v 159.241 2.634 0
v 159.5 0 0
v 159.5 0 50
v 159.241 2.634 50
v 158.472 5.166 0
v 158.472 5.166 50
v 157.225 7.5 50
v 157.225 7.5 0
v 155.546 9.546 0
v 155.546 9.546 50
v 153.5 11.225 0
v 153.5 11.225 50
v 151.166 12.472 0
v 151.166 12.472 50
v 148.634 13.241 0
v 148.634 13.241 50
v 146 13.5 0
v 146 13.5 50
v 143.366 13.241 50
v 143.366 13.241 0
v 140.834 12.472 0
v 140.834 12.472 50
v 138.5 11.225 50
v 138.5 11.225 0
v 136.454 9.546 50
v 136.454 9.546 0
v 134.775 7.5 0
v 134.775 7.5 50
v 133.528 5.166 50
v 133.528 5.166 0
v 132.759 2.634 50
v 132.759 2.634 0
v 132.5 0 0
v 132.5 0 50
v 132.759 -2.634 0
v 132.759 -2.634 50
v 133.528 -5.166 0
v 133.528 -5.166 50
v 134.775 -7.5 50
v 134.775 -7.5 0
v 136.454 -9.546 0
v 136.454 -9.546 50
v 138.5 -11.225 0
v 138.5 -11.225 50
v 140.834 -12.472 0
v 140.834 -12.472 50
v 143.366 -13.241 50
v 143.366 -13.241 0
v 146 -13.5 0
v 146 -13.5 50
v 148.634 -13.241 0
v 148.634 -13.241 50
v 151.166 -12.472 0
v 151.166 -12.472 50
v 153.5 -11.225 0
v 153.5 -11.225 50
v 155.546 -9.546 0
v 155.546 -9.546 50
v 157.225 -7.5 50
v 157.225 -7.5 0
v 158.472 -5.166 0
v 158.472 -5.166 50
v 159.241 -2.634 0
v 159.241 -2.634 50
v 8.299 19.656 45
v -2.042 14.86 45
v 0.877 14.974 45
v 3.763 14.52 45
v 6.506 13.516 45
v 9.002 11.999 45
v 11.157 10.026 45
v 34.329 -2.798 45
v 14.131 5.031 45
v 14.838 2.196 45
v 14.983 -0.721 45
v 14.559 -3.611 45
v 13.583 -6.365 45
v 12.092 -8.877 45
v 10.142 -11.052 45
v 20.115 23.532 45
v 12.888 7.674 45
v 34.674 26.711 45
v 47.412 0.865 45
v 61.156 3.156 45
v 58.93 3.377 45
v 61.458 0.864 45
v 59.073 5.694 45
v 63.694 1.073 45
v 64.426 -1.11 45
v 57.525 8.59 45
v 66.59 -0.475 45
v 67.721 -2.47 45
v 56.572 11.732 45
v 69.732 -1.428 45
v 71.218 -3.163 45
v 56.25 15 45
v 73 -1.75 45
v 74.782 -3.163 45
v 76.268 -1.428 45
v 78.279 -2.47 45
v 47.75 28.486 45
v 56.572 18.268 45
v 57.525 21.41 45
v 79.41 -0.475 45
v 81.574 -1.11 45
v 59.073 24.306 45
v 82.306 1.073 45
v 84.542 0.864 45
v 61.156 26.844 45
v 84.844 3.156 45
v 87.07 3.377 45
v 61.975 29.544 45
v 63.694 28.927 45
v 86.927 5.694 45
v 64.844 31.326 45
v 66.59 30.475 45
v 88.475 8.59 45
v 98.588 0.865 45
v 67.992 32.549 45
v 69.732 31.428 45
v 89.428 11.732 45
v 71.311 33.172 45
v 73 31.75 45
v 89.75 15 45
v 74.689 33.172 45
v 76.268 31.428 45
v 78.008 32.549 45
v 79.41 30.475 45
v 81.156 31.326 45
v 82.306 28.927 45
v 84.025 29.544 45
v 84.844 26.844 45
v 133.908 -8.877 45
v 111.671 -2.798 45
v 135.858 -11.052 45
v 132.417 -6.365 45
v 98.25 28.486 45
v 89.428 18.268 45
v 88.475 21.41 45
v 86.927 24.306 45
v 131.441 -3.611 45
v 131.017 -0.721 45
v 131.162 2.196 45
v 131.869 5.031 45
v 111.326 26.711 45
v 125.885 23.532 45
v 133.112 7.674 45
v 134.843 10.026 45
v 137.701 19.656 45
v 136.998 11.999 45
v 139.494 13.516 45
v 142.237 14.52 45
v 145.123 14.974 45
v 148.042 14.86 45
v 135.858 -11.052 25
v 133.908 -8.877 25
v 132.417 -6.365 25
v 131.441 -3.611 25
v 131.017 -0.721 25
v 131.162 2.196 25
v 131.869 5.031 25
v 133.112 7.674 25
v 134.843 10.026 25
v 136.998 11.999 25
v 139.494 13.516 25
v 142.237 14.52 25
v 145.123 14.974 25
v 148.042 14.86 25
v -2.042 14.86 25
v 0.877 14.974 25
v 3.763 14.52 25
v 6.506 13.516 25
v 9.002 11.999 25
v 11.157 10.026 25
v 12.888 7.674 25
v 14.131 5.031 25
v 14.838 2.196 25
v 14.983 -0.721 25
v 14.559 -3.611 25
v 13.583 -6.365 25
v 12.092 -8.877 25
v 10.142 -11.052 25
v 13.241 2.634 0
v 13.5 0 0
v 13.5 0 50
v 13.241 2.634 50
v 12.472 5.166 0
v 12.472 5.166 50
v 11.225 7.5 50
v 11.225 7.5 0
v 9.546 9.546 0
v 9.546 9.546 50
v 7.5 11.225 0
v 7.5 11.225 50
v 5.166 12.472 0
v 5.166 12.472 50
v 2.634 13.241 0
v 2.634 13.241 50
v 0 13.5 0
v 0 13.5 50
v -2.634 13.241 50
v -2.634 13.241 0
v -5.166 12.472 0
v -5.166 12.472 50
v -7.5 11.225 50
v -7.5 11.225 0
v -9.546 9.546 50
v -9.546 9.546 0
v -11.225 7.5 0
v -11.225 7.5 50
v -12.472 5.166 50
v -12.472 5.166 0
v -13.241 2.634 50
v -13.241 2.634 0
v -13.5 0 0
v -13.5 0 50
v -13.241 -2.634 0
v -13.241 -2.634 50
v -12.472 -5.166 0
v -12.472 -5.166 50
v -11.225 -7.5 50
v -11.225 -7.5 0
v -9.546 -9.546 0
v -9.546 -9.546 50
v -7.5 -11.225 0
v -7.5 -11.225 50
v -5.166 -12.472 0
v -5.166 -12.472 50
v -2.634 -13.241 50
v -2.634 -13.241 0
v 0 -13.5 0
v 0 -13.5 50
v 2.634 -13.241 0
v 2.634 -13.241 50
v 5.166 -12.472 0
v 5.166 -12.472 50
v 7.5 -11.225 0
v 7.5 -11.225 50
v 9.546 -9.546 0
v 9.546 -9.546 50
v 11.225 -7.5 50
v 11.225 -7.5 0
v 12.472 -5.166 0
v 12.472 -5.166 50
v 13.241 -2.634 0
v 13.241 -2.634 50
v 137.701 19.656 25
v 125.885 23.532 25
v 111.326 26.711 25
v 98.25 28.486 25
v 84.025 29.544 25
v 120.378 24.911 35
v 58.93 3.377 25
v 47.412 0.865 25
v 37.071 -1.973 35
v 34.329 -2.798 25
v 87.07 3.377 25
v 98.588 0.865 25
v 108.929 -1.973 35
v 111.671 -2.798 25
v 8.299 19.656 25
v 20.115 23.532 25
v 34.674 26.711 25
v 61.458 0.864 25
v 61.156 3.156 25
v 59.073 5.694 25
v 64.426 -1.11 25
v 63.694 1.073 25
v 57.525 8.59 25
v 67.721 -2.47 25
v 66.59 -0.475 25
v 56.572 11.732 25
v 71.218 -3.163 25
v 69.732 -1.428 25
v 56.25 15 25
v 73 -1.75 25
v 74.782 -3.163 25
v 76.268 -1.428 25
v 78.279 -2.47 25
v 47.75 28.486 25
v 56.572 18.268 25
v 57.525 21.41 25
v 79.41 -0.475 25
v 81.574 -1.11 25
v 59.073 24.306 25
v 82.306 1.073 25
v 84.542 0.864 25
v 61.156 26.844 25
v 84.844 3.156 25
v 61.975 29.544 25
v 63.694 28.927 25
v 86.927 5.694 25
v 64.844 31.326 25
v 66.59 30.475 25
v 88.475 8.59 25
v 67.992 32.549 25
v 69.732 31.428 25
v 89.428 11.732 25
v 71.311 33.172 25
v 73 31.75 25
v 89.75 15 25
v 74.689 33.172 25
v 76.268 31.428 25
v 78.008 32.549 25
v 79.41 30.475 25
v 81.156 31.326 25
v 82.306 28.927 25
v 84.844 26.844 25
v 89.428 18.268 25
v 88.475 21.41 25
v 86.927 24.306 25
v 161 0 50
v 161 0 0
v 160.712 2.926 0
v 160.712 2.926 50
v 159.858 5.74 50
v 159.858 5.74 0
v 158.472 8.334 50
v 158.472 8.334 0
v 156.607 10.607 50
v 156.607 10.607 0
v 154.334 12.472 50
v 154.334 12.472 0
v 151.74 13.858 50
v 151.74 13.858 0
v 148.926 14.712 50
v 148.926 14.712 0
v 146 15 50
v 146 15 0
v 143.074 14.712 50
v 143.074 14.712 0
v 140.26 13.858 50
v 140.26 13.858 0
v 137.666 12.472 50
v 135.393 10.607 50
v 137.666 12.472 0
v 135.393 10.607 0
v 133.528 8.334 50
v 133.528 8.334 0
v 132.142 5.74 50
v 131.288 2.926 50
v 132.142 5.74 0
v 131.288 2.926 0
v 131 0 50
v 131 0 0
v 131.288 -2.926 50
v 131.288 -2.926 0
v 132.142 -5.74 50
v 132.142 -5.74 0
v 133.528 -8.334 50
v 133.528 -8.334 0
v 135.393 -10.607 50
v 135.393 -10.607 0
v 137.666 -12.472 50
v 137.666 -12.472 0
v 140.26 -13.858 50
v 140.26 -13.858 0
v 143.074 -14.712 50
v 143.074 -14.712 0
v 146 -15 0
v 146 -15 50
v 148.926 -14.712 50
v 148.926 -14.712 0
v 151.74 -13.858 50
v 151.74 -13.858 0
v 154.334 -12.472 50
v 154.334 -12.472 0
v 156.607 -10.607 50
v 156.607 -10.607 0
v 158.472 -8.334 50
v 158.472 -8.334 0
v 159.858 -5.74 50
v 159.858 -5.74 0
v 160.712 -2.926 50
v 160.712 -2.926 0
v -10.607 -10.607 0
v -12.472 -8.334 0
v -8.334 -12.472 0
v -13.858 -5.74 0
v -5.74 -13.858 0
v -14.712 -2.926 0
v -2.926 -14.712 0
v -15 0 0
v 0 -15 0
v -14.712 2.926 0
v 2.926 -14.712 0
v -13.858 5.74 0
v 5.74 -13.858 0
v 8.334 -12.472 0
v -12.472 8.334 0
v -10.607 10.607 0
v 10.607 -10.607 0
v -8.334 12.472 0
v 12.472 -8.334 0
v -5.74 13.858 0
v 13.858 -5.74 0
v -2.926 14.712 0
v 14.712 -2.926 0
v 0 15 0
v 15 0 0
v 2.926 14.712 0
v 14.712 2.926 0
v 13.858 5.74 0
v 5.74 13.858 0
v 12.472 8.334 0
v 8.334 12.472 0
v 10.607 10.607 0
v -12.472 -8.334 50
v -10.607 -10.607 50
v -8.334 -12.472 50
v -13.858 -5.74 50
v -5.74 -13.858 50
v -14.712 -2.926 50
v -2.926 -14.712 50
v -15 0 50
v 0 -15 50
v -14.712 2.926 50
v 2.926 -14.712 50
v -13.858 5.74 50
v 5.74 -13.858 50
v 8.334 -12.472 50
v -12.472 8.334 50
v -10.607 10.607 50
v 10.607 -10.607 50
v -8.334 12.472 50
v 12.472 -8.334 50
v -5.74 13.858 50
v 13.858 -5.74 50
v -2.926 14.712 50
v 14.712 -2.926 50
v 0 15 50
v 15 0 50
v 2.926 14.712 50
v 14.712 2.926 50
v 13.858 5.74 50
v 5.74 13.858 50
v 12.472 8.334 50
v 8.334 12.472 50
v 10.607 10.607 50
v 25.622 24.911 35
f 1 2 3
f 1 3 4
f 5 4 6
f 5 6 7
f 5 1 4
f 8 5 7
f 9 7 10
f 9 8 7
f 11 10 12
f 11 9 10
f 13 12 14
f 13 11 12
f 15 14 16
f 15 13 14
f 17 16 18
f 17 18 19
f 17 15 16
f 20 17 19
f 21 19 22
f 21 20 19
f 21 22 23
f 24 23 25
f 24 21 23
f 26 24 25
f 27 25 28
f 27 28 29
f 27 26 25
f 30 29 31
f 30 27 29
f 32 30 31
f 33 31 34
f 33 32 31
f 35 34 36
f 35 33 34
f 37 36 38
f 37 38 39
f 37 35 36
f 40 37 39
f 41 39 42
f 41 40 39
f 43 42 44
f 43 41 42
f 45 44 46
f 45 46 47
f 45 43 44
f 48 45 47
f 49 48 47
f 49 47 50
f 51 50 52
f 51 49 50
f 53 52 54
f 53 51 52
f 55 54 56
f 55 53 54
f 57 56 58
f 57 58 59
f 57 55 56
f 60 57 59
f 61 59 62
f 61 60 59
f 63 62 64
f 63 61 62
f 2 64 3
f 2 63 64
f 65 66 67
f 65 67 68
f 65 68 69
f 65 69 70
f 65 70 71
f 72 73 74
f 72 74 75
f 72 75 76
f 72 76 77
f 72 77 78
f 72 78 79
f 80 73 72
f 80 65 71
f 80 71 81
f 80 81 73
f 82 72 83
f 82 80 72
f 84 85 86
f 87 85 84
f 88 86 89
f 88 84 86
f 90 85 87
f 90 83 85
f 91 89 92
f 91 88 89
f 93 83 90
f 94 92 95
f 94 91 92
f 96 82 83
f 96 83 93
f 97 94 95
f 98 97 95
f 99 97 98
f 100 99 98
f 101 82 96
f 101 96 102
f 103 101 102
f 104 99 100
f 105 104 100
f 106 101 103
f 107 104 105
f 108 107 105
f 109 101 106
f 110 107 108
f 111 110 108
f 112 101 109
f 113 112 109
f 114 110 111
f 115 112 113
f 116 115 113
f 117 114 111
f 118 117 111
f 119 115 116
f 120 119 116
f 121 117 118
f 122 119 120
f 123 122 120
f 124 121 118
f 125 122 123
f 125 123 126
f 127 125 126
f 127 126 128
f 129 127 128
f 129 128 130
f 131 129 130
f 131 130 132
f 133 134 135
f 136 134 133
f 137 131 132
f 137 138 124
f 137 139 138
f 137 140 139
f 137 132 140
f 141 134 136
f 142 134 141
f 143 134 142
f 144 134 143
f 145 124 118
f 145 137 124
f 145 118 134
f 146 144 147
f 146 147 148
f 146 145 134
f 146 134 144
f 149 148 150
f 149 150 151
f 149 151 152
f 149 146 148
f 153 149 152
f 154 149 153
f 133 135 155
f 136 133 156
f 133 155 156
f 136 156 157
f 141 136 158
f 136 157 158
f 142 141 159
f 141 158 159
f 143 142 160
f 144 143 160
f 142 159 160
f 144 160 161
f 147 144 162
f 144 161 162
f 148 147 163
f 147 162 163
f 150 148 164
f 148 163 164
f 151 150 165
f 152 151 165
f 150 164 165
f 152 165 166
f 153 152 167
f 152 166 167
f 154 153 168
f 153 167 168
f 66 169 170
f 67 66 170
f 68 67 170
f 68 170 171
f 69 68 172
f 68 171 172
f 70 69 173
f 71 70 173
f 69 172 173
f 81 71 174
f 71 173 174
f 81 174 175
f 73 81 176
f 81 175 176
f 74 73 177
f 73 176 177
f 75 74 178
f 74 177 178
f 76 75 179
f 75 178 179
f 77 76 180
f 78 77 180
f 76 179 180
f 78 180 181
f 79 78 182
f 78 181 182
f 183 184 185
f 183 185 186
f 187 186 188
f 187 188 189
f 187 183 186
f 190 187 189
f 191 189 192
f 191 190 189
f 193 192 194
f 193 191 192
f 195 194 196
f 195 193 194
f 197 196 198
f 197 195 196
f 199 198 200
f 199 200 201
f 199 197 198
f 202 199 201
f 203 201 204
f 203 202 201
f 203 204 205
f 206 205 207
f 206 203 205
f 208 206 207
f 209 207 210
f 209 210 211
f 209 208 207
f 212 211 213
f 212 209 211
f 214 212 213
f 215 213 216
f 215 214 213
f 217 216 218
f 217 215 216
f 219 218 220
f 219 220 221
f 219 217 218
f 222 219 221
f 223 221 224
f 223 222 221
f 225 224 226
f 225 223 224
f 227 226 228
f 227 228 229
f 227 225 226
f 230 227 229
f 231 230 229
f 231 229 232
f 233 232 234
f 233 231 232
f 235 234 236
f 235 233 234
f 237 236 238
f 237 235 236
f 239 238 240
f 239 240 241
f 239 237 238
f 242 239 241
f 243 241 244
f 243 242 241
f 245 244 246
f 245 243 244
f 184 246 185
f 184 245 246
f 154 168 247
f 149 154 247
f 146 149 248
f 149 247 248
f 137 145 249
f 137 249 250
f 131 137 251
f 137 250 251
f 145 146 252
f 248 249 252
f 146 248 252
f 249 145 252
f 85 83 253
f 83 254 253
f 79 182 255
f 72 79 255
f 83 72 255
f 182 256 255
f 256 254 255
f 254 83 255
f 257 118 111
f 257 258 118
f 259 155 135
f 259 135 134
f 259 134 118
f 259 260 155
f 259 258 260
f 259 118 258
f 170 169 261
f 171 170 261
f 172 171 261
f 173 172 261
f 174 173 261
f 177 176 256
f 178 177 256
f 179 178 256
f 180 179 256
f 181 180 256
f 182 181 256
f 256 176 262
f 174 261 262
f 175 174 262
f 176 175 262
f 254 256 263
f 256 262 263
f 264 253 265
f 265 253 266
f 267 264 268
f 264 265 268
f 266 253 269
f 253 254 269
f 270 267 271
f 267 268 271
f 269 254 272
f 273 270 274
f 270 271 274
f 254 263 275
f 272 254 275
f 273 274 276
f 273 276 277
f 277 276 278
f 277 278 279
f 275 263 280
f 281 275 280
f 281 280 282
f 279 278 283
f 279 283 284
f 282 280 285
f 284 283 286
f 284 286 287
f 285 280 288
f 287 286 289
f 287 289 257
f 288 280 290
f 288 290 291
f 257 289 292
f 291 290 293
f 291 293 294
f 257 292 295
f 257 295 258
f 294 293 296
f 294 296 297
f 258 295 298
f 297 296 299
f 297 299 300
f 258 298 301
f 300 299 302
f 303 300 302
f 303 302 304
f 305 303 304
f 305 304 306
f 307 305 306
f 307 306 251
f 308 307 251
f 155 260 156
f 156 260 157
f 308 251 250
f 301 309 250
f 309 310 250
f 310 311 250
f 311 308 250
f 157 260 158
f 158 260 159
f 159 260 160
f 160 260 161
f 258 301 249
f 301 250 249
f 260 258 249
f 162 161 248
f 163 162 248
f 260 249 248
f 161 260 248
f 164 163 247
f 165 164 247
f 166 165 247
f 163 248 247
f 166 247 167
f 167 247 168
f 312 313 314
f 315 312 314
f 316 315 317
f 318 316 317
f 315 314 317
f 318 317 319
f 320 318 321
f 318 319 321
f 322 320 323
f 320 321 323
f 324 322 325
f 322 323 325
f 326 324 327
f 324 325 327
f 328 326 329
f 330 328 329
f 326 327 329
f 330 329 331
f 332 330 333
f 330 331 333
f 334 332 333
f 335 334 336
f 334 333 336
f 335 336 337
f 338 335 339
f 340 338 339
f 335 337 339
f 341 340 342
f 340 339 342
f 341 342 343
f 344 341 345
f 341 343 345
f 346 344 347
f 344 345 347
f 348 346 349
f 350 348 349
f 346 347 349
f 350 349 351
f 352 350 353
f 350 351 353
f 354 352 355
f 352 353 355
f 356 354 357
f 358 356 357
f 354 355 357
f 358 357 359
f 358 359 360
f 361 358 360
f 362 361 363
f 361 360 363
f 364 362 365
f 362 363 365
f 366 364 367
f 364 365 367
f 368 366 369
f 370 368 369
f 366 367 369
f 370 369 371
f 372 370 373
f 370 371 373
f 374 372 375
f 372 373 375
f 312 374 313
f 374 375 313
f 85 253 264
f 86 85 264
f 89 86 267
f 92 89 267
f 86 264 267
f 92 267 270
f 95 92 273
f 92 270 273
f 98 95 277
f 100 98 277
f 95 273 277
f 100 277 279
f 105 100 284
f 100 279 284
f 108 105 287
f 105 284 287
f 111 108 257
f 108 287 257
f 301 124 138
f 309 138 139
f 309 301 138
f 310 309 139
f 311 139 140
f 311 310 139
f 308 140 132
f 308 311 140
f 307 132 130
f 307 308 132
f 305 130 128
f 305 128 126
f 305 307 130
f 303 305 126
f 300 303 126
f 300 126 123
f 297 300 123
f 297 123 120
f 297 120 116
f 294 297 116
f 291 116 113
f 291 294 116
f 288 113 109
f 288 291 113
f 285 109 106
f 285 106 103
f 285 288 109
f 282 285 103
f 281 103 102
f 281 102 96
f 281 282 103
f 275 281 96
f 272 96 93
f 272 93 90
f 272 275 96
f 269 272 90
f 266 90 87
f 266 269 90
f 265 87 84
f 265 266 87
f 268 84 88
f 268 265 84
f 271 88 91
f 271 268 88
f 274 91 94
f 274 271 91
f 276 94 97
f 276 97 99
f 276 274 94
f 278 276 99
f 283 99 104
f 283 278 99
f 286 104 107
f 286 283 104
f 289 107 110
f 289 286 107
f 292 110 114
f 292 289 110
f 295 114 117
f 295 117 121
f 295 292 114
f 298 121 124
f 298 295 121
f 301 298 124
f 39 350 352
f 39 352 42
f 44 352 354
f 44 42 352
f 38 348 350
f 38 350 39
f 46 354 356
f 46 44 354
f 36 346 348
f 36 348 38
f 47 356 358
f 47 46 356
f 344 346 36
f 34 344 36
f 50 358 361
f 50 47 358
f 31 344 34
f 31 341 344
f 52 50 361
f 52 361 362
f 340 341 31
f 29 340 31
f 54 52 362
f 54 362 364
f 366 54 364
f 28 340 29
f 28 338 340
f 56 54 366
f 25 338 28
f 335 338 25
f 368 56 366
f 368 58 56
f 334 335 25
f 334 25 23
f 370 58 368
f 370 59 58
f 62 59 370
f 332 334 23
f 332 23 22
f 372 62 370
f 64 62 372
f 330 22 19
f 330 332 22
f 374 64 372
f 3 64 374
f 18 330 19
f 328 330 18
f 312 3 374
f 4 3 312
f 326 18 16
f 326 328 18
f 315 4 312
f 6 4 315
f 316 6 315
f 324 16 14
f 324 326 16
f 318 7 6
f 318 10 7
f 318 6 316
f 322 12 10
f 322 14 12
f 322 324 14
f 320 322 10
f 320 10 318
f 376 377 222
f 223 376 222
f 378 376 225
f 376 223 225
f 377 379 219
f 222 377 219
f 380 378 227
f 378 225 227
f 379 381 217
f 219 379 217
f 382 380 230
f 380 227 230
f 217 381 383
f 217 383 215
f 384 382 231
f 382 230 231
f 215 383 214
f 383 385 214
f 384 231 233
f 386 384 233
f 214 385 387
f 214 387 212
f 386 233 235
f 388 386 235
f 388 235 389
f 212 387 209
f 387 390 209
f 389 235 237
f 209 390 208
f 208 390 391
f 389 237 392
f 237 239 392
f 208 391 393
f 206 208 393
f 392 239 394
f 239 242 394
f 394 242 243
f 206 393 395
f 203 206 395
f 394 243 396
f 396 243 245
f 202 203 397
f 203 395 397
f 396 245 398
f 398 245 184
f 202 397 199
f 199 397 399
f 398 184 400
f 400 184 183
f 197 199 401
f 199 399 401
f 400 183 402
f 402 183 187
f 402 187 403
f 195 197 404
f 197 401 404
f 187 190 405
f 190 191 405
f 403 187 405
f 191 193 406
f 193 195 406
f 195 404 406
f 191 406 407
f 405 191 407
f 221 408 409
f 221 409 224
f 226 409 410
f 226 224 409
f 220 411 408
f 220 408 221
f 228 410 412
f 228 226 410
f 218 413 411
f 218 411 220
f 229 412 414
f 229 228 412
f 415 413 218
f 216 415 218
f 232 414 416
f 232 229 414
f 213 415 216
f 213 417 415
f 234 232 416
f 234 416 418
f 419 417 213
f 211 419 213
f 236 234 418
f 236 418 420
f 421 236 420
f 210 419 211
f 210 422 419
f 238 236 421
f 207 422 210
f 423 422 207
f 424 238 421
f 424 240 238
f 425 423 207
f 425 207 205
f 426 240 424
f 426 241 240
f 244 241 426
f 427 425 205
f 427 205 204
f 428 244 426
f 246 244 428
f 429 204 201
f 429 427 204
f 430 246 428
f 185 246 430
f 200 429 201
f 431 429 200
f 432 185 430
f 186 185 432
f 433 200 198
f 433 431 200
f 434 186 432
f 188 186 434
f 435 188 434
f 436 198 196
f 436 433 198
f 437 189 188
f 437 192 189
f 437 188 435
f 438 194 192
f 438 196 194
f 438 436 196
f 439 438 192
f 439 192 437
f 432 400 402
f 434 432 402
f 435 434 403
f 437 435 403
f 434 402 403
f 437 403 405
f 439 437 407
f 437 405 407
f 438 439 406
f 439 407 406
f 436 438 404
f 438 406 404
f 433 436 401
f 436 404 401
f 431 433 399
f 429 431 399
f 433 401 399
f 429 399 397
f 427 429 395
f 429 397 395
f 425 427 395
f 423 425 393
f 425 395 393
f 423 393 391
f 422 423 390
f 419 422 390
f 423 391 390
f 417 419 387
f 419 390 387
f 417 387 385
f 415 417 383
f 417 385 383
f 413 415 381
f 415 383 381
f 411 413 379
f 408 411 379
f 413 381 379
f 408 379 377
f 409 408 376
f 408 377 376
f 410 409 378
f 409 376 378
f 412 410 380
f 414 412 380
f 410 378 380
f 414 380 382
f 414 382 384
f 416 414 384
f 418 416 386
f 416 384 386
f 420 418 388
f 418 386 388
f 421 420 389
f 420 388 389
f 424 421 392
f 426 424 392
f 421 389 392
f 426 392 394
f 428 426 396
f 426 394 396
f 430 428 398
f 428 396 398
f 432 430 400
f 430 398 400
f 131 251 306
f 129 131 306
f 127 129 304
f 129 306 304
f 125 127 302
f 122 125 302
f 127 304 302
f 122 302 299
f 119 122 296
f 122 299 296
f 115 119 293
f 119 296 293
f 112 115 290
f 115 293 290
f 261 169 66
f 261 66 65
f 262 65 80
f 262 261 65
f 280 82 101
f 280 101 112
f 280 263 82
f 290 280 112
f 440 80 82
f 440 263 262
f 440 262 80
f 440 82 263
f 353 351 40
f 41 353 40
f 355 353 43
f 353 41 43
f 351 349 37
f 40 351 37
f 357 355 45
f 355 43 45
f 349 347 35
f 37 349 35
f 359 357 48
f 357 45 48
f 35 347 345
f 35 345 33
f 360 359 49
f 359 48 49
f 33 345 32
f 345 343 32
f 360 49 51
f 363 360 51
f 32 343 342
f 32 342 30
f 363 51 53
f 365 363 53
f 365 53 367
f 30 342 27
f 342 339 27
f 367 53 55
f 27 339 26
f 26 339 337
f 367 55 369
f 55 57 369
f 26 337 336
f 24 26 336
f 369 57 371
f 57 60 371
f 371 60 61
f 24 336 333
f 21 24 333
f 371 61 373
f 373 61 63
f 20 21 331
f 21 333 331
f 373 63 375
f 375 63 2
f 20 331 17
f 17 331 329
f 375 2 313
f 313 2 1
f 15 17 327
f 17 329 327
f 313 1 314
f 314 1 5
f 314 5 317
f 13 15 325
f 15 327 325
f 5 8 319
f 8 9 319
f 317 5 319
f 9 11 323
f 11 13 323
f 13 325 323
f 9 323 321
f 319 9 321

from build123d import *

# Parameters (mm, degrees)
SKETCH1_R             = 15
SKETCH1_R_2           = 13.5
BOSS_EXTRUDE1_DEPTH   = 50
BOSS_EXTRUDE1_2_DEPTH = 50
SKETCH2_R             = 16.75
BOSS_EXTRUDE5_DEPTH   = 20


with BuildPart() as part:
    # Sketch1 → Boss-Extrude1 (new body)
    with BuildSketch(Plane.XY):
        Circle(SKETCH1_R)
        Circle(SKETCH1_R_2, mode=Mode.SUBTRACT)
    extrude(amount=BOSS_EXTRUDE1_DEPTH)


with BuildPart() as body_2:
    # Sketch1 → Boss-Extrude1 2 (new body)
    with BuildSketch(Plane.XY):
        with Locations((146, 0)):
            Circle(SKETCH1_R)
        with Locations((146, 0)):
            Circle(SKETCH1_R_2, mode=Mode.SUBTRACT)
    extrude(amount=BOSS_EXTRUDE1_2_DEPTH)


with BuildPart() as body_3:
    # Sketch2 → Boss-Extrude5 (new body)
    with BuildSketch(Plane.XY.offset(25)):
        with BuildLine():
            ThreePointArc((58.930048431, 3.376792059), (73, -3.25), (87.069951569, 3.376792059))
            add(Edge.make_bspline(
                [(135.858074214, -11.051757388), (106.393657142, -0.108887447), (87.069951569, 3.376792059)],
                knots=[0, 0, 0, 1, 1, 1], degree=2))
            ThreePointArc((135.858074214, -11.051757388), (132.425663063, 6.382583858), (148.04182941, 14.860381309))
            add(Edge.make_bspline(
                [(148.04182941, 14.860381309), (124.723417301, 27.619088806), (84.024892619, 29.54352924)],
                knots=[0, 0, 0, 1, 1, 1], degree=2))
            ThreePointArc((84.024892619, 29.54352924), (73, 33.25), (61.975107381, 29.54352924))
            add(Edge.make_bspline(
                [(-2.04182941, 14.860381309), (21.276582699, 27.619088806), (61.975107381, 29.54352924)],
                knots=[0, 0, 0, 1, 1, 1], degree=2))
            ThreePointArc((-2.04182941, 14.860381309), (13.574336937, 6.382583858), (10.141925786, -11.051757388))
            add(Edge.make_bspline(
                [(10.141925786, -11.051757388), (39.606342858, -0.108887447), (58.930048431, 3.376792059)],
                knots=[0, 0, 0, 1, 1, 1], degree=2))
        make_face()
        with Locations((73, 15)):
            Circle(SKETCH2_R, mode=Mode.SUBTRACT)
    extrude(amount=BOSS_EXTRUDE5_DEPTH)


solid = Compound([part.part, body_2.part, body_3.part])
